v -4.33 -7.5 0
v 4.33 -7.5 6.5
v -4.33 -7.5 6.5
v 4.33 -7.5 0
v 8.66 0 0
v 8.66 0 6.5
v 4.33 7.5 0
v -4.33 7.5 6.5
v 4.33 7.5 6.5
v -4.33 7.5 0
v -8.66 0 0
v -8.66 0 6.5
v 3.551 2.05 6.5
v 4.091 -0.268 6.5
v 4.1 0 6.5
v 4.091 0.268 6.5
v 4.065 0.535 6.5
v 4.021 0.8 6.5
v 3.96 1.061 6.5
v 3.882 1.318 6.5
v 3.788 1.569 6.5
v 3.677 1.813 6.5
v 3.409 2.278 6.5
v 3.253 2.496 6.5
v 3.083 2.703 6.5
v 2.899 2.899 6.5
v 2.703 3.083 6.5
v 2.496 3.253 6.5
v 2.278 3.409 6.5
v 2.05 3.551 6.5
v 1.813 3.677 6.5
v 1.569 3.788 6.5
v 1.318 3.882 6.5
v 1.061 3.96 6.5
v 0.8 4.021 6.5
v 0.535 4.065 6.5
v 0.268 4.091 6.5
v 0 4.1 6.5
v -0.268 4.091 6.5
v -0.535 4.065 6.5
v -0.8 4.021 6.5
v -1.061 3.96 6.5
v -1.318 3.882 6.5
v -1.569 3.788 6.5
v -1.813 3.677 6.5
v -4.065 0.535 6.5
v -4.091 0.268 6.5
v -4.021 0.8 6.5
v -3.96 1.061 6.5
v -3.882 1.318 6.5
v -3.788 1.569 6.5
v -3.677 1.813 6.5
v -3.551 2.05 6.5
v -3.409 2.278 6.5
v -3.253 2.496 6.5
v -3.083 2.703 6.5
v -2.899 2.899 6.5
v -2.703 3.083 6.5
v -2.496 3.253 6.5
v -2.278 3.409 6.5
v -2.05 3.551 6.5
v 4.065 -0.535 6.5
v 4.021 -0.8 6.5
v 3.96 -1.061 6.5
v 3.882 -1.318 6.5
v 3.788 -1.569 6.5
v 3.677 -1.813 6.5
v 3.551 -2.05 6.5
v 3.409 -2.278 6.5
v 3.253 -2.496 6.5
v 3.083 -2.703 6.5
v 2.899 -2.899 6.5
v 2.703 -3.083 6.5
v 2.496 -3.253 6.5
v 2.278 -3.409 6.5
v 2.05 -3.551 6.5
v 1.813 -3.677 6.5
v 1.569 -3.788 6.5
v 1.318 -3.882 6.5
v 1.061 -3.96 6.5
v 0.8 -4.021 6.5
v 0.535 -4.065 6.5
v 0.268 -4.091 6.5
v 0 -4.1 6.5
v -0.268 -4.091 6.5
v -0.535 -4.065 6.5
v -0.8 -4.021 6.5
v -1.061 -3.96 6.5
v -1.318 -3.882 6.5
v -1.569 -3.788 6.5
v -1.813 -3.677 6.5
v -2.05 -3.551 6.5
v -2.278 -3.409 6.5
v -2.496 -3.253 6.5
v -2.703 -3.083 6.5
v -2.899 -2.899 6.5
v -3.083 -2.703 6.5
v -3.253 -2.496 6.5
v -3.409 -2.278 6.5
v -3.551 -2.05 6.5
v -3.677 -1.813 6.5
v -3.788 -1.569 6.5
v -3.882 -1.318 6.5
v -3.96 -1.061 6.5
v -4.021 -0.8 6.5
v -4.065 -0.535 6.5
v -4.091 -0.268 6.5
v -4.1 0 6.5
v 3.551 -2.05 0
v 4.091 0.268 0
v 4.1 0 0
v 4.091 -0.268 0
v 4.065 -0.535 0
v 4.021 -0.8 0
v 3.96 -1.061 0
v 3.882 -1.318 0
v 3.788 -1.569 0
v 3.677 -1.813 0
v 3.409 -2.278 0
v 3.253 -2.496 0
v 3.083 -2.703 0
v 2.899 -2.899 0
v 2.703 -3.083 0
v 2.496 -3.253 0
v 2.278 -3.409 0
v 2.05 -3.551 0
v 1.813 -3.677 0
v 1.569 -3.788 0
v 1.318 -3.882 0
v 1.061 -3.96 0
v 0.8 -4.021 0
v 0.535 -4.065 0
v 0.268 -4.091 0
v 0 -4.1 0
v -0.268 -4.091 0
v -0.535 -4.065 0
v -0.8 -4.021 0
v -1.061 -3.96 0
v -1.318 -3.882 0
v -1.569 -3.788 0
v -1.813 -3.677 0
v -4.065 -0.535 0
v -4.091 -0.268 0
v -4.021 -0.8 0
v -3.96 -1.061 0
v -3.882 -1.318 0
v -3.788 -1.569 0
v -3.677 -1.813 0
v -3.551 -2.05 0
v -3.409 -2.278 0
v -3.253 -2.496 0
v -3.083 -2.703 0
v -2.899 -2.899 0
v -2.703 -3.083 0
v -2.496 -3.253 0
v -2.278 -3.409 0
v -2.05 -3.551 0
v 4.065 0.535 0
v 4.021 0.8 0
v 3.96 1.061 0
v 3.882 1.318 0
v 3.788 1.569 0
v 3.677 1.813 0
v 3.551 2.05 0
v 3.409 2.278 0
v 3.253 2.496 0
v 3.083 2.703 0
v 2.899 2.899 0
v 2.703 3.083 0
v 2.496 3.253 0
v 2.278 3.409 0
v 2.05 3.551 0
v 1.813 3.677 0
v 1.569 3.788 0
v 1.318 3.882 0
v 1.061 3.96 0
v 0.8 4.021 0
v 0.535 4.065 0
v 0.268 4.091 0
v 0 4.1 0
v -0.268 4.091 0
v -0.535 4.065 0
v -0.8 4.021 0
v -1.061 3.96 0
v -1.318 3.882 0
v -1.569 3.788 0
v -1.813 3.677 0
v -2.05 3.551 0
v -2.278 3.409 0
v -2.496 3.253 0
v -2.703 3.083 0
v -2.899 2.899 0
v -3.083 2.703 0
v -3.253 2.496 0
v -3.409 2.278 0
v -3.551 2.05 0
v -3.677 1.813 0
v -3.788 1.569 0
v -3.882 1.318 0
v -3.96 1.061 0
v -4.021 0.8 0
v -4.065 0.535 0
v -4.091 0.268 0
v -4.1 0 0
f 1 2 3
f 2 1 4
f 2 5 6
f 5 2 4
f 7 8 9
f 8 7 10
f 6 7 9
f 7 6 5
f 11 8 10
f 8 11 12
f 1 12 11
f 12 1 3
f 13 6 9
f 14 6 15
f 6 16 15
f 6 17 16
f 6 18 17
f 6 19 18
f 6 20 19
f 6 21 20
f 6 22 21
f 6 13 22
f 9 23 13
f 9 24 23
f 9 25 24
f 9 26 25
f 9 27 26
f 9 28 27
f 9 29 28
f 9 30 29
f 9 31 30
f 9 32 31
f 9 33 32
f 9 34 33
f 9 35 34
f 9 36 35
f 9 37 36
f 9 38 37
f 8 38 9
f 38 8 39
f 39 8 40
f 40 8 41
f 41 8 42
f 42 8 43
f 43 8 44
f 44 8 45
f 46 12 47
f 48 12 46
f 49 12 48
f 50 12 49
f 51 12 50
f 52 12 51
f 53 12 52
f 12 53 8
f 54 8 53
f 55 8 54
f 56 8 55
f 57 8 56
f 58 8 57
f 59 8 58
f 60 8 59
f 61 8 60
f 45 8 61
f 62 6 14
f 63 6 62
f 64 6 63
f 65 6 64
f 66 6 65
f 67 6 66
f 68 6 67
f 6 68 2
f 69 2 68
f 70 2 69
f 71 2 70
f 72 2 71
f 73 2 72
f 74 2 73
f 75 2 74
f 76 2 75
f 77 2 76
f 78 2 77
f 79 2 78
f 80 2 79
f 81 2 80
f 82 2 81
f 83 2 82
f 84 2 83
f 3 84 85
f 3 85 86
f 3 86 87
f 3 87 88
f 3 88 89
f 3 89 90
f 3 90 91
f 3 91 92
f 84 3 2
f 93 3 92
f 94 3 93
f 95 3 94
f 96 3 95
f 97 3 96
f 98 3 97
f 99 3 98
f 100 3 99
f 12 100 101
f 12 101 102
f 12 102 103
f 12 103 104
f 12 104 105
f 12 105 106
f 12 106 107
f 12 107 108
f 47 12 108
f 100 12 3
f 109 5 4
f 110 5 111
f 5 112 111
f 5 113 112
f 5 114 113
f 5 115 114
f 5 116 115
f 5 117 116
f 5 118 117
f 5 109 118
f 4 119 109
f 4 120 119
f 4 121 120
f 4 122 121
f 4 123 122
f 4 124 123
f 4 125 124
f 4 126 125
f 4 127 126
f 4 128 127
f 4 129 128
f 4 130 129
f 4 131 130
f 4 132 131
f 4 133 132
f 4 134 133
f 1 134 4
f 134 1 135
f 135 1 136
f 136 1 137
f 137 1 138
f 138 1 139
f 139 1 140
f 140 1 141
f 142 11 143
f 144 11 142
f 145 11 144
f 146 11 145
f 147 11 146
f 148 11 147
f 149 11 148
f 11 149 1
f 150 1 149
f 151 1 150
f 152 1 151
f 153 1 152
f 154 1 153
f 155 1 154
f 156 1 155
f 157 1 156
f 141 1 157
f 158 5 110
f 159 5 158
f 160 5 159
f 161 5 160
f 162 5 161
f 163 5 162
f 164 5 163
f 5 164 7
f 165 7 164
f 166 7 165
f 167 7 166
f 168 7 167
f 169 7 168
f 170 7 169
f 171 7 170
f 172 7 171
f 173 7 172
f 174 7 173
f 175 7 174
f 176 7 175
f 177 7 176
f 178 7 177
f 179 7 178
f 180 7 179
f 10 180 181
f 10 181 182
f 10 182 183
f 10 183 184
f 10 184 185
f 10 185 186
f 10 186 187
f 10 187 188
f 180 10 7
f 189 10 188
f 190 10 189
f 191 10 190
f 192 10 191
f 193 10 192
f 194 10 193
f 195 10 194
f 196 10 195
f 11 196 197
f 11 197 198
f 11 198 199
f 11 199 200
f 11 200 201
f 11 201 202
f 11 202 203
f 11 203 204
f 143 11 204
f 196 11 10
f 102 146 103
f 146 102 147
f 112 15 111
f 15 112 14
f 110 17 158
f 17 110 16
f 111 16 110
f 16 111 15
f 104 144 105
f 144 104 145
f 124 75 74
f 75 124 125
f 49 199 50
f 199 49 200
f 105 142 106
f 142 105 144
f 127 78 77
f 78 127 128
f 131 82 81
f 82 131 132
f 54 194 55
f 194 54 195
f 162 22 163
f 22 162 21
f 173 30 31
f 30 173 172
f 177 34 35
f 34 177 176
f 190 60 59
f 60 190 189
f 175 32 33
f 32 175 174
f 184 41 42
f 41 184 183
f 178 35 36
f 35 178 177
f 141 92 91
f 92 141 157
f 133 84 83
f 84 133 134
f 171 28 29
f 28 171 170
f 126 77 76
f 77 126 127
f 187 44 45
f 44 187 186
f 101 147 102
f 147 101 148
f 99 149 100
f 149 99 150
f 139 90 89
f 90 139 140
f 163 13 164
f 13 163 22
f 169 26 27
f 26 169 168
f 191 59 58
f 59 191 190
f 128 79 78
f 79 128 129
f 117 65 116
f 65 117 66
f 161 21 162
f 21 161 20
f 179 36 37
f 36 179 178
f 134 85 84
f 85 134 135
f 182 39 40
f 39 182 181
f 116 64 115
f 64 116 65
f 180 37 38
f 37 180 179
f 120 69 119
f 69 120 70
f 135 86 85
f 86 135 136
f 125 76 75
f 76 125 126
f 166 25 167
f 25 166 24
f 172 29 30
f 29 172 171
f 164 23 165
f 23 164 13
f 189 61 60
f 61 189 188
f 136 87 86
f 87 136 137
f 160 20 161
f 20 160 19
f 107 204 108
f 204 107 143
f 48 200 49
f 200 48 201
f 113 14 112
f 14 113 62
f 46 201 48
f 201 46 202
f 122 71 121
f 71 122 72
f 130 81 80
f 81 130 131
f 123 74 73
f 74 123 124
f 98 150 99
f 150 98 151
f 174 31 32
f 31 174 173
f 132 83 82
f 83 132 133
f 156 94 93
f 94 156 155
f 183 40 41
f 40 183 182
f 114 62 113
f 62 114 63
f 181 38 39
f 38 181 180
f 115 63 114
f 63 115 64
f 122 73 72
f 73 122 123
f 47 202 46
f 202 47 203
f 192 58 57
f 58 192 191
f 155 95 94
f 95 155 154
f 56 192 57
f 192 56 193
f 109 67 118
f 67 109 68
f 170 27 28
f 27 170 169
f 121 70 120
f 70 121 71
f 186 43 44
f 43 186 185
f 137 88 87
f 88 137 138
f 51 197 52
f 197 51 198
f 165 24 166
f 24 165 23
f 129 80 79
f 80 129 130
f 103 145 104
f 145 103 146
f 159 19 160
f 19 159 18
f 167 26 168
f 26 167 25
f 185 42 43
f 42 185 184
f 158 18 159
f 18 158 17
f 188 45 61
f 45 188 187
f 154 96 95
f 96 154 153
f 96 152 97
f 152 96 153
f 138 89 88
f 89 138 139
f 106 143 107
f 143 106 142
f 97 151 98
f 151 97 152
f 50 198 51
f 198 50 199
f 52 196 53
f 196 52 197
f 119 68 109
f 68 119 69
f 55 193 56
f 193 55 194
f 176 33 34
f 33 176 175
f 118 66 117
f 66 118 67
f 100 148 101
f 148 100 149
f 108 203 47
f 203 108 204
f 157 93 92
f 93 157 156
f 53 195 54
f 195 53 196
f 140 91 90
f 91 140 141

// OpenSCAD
$fn = 96;

module hex_nut(screw_d=8.0, across_flats=15.0, thickness=6.5, clearance=0.2) {
    hole_d = screw_d + clearance;                 // simple clearance hole (not threaded)
    hex_R  = across_flats / sqrt(3);              // circumradius for given across-flats

    difference() {
        // Hex body: 15.0mm across flats, 6.5mm thick
        cylinder(h=thickness, r=hex_R, $fn=6);

        // Central through-hole: fully cuts through with small extra height
        translate([0, 0, -0.1])
            cylinder(h=thickness + 0.2, d=hole_d);
    }
}

hex_nut();
